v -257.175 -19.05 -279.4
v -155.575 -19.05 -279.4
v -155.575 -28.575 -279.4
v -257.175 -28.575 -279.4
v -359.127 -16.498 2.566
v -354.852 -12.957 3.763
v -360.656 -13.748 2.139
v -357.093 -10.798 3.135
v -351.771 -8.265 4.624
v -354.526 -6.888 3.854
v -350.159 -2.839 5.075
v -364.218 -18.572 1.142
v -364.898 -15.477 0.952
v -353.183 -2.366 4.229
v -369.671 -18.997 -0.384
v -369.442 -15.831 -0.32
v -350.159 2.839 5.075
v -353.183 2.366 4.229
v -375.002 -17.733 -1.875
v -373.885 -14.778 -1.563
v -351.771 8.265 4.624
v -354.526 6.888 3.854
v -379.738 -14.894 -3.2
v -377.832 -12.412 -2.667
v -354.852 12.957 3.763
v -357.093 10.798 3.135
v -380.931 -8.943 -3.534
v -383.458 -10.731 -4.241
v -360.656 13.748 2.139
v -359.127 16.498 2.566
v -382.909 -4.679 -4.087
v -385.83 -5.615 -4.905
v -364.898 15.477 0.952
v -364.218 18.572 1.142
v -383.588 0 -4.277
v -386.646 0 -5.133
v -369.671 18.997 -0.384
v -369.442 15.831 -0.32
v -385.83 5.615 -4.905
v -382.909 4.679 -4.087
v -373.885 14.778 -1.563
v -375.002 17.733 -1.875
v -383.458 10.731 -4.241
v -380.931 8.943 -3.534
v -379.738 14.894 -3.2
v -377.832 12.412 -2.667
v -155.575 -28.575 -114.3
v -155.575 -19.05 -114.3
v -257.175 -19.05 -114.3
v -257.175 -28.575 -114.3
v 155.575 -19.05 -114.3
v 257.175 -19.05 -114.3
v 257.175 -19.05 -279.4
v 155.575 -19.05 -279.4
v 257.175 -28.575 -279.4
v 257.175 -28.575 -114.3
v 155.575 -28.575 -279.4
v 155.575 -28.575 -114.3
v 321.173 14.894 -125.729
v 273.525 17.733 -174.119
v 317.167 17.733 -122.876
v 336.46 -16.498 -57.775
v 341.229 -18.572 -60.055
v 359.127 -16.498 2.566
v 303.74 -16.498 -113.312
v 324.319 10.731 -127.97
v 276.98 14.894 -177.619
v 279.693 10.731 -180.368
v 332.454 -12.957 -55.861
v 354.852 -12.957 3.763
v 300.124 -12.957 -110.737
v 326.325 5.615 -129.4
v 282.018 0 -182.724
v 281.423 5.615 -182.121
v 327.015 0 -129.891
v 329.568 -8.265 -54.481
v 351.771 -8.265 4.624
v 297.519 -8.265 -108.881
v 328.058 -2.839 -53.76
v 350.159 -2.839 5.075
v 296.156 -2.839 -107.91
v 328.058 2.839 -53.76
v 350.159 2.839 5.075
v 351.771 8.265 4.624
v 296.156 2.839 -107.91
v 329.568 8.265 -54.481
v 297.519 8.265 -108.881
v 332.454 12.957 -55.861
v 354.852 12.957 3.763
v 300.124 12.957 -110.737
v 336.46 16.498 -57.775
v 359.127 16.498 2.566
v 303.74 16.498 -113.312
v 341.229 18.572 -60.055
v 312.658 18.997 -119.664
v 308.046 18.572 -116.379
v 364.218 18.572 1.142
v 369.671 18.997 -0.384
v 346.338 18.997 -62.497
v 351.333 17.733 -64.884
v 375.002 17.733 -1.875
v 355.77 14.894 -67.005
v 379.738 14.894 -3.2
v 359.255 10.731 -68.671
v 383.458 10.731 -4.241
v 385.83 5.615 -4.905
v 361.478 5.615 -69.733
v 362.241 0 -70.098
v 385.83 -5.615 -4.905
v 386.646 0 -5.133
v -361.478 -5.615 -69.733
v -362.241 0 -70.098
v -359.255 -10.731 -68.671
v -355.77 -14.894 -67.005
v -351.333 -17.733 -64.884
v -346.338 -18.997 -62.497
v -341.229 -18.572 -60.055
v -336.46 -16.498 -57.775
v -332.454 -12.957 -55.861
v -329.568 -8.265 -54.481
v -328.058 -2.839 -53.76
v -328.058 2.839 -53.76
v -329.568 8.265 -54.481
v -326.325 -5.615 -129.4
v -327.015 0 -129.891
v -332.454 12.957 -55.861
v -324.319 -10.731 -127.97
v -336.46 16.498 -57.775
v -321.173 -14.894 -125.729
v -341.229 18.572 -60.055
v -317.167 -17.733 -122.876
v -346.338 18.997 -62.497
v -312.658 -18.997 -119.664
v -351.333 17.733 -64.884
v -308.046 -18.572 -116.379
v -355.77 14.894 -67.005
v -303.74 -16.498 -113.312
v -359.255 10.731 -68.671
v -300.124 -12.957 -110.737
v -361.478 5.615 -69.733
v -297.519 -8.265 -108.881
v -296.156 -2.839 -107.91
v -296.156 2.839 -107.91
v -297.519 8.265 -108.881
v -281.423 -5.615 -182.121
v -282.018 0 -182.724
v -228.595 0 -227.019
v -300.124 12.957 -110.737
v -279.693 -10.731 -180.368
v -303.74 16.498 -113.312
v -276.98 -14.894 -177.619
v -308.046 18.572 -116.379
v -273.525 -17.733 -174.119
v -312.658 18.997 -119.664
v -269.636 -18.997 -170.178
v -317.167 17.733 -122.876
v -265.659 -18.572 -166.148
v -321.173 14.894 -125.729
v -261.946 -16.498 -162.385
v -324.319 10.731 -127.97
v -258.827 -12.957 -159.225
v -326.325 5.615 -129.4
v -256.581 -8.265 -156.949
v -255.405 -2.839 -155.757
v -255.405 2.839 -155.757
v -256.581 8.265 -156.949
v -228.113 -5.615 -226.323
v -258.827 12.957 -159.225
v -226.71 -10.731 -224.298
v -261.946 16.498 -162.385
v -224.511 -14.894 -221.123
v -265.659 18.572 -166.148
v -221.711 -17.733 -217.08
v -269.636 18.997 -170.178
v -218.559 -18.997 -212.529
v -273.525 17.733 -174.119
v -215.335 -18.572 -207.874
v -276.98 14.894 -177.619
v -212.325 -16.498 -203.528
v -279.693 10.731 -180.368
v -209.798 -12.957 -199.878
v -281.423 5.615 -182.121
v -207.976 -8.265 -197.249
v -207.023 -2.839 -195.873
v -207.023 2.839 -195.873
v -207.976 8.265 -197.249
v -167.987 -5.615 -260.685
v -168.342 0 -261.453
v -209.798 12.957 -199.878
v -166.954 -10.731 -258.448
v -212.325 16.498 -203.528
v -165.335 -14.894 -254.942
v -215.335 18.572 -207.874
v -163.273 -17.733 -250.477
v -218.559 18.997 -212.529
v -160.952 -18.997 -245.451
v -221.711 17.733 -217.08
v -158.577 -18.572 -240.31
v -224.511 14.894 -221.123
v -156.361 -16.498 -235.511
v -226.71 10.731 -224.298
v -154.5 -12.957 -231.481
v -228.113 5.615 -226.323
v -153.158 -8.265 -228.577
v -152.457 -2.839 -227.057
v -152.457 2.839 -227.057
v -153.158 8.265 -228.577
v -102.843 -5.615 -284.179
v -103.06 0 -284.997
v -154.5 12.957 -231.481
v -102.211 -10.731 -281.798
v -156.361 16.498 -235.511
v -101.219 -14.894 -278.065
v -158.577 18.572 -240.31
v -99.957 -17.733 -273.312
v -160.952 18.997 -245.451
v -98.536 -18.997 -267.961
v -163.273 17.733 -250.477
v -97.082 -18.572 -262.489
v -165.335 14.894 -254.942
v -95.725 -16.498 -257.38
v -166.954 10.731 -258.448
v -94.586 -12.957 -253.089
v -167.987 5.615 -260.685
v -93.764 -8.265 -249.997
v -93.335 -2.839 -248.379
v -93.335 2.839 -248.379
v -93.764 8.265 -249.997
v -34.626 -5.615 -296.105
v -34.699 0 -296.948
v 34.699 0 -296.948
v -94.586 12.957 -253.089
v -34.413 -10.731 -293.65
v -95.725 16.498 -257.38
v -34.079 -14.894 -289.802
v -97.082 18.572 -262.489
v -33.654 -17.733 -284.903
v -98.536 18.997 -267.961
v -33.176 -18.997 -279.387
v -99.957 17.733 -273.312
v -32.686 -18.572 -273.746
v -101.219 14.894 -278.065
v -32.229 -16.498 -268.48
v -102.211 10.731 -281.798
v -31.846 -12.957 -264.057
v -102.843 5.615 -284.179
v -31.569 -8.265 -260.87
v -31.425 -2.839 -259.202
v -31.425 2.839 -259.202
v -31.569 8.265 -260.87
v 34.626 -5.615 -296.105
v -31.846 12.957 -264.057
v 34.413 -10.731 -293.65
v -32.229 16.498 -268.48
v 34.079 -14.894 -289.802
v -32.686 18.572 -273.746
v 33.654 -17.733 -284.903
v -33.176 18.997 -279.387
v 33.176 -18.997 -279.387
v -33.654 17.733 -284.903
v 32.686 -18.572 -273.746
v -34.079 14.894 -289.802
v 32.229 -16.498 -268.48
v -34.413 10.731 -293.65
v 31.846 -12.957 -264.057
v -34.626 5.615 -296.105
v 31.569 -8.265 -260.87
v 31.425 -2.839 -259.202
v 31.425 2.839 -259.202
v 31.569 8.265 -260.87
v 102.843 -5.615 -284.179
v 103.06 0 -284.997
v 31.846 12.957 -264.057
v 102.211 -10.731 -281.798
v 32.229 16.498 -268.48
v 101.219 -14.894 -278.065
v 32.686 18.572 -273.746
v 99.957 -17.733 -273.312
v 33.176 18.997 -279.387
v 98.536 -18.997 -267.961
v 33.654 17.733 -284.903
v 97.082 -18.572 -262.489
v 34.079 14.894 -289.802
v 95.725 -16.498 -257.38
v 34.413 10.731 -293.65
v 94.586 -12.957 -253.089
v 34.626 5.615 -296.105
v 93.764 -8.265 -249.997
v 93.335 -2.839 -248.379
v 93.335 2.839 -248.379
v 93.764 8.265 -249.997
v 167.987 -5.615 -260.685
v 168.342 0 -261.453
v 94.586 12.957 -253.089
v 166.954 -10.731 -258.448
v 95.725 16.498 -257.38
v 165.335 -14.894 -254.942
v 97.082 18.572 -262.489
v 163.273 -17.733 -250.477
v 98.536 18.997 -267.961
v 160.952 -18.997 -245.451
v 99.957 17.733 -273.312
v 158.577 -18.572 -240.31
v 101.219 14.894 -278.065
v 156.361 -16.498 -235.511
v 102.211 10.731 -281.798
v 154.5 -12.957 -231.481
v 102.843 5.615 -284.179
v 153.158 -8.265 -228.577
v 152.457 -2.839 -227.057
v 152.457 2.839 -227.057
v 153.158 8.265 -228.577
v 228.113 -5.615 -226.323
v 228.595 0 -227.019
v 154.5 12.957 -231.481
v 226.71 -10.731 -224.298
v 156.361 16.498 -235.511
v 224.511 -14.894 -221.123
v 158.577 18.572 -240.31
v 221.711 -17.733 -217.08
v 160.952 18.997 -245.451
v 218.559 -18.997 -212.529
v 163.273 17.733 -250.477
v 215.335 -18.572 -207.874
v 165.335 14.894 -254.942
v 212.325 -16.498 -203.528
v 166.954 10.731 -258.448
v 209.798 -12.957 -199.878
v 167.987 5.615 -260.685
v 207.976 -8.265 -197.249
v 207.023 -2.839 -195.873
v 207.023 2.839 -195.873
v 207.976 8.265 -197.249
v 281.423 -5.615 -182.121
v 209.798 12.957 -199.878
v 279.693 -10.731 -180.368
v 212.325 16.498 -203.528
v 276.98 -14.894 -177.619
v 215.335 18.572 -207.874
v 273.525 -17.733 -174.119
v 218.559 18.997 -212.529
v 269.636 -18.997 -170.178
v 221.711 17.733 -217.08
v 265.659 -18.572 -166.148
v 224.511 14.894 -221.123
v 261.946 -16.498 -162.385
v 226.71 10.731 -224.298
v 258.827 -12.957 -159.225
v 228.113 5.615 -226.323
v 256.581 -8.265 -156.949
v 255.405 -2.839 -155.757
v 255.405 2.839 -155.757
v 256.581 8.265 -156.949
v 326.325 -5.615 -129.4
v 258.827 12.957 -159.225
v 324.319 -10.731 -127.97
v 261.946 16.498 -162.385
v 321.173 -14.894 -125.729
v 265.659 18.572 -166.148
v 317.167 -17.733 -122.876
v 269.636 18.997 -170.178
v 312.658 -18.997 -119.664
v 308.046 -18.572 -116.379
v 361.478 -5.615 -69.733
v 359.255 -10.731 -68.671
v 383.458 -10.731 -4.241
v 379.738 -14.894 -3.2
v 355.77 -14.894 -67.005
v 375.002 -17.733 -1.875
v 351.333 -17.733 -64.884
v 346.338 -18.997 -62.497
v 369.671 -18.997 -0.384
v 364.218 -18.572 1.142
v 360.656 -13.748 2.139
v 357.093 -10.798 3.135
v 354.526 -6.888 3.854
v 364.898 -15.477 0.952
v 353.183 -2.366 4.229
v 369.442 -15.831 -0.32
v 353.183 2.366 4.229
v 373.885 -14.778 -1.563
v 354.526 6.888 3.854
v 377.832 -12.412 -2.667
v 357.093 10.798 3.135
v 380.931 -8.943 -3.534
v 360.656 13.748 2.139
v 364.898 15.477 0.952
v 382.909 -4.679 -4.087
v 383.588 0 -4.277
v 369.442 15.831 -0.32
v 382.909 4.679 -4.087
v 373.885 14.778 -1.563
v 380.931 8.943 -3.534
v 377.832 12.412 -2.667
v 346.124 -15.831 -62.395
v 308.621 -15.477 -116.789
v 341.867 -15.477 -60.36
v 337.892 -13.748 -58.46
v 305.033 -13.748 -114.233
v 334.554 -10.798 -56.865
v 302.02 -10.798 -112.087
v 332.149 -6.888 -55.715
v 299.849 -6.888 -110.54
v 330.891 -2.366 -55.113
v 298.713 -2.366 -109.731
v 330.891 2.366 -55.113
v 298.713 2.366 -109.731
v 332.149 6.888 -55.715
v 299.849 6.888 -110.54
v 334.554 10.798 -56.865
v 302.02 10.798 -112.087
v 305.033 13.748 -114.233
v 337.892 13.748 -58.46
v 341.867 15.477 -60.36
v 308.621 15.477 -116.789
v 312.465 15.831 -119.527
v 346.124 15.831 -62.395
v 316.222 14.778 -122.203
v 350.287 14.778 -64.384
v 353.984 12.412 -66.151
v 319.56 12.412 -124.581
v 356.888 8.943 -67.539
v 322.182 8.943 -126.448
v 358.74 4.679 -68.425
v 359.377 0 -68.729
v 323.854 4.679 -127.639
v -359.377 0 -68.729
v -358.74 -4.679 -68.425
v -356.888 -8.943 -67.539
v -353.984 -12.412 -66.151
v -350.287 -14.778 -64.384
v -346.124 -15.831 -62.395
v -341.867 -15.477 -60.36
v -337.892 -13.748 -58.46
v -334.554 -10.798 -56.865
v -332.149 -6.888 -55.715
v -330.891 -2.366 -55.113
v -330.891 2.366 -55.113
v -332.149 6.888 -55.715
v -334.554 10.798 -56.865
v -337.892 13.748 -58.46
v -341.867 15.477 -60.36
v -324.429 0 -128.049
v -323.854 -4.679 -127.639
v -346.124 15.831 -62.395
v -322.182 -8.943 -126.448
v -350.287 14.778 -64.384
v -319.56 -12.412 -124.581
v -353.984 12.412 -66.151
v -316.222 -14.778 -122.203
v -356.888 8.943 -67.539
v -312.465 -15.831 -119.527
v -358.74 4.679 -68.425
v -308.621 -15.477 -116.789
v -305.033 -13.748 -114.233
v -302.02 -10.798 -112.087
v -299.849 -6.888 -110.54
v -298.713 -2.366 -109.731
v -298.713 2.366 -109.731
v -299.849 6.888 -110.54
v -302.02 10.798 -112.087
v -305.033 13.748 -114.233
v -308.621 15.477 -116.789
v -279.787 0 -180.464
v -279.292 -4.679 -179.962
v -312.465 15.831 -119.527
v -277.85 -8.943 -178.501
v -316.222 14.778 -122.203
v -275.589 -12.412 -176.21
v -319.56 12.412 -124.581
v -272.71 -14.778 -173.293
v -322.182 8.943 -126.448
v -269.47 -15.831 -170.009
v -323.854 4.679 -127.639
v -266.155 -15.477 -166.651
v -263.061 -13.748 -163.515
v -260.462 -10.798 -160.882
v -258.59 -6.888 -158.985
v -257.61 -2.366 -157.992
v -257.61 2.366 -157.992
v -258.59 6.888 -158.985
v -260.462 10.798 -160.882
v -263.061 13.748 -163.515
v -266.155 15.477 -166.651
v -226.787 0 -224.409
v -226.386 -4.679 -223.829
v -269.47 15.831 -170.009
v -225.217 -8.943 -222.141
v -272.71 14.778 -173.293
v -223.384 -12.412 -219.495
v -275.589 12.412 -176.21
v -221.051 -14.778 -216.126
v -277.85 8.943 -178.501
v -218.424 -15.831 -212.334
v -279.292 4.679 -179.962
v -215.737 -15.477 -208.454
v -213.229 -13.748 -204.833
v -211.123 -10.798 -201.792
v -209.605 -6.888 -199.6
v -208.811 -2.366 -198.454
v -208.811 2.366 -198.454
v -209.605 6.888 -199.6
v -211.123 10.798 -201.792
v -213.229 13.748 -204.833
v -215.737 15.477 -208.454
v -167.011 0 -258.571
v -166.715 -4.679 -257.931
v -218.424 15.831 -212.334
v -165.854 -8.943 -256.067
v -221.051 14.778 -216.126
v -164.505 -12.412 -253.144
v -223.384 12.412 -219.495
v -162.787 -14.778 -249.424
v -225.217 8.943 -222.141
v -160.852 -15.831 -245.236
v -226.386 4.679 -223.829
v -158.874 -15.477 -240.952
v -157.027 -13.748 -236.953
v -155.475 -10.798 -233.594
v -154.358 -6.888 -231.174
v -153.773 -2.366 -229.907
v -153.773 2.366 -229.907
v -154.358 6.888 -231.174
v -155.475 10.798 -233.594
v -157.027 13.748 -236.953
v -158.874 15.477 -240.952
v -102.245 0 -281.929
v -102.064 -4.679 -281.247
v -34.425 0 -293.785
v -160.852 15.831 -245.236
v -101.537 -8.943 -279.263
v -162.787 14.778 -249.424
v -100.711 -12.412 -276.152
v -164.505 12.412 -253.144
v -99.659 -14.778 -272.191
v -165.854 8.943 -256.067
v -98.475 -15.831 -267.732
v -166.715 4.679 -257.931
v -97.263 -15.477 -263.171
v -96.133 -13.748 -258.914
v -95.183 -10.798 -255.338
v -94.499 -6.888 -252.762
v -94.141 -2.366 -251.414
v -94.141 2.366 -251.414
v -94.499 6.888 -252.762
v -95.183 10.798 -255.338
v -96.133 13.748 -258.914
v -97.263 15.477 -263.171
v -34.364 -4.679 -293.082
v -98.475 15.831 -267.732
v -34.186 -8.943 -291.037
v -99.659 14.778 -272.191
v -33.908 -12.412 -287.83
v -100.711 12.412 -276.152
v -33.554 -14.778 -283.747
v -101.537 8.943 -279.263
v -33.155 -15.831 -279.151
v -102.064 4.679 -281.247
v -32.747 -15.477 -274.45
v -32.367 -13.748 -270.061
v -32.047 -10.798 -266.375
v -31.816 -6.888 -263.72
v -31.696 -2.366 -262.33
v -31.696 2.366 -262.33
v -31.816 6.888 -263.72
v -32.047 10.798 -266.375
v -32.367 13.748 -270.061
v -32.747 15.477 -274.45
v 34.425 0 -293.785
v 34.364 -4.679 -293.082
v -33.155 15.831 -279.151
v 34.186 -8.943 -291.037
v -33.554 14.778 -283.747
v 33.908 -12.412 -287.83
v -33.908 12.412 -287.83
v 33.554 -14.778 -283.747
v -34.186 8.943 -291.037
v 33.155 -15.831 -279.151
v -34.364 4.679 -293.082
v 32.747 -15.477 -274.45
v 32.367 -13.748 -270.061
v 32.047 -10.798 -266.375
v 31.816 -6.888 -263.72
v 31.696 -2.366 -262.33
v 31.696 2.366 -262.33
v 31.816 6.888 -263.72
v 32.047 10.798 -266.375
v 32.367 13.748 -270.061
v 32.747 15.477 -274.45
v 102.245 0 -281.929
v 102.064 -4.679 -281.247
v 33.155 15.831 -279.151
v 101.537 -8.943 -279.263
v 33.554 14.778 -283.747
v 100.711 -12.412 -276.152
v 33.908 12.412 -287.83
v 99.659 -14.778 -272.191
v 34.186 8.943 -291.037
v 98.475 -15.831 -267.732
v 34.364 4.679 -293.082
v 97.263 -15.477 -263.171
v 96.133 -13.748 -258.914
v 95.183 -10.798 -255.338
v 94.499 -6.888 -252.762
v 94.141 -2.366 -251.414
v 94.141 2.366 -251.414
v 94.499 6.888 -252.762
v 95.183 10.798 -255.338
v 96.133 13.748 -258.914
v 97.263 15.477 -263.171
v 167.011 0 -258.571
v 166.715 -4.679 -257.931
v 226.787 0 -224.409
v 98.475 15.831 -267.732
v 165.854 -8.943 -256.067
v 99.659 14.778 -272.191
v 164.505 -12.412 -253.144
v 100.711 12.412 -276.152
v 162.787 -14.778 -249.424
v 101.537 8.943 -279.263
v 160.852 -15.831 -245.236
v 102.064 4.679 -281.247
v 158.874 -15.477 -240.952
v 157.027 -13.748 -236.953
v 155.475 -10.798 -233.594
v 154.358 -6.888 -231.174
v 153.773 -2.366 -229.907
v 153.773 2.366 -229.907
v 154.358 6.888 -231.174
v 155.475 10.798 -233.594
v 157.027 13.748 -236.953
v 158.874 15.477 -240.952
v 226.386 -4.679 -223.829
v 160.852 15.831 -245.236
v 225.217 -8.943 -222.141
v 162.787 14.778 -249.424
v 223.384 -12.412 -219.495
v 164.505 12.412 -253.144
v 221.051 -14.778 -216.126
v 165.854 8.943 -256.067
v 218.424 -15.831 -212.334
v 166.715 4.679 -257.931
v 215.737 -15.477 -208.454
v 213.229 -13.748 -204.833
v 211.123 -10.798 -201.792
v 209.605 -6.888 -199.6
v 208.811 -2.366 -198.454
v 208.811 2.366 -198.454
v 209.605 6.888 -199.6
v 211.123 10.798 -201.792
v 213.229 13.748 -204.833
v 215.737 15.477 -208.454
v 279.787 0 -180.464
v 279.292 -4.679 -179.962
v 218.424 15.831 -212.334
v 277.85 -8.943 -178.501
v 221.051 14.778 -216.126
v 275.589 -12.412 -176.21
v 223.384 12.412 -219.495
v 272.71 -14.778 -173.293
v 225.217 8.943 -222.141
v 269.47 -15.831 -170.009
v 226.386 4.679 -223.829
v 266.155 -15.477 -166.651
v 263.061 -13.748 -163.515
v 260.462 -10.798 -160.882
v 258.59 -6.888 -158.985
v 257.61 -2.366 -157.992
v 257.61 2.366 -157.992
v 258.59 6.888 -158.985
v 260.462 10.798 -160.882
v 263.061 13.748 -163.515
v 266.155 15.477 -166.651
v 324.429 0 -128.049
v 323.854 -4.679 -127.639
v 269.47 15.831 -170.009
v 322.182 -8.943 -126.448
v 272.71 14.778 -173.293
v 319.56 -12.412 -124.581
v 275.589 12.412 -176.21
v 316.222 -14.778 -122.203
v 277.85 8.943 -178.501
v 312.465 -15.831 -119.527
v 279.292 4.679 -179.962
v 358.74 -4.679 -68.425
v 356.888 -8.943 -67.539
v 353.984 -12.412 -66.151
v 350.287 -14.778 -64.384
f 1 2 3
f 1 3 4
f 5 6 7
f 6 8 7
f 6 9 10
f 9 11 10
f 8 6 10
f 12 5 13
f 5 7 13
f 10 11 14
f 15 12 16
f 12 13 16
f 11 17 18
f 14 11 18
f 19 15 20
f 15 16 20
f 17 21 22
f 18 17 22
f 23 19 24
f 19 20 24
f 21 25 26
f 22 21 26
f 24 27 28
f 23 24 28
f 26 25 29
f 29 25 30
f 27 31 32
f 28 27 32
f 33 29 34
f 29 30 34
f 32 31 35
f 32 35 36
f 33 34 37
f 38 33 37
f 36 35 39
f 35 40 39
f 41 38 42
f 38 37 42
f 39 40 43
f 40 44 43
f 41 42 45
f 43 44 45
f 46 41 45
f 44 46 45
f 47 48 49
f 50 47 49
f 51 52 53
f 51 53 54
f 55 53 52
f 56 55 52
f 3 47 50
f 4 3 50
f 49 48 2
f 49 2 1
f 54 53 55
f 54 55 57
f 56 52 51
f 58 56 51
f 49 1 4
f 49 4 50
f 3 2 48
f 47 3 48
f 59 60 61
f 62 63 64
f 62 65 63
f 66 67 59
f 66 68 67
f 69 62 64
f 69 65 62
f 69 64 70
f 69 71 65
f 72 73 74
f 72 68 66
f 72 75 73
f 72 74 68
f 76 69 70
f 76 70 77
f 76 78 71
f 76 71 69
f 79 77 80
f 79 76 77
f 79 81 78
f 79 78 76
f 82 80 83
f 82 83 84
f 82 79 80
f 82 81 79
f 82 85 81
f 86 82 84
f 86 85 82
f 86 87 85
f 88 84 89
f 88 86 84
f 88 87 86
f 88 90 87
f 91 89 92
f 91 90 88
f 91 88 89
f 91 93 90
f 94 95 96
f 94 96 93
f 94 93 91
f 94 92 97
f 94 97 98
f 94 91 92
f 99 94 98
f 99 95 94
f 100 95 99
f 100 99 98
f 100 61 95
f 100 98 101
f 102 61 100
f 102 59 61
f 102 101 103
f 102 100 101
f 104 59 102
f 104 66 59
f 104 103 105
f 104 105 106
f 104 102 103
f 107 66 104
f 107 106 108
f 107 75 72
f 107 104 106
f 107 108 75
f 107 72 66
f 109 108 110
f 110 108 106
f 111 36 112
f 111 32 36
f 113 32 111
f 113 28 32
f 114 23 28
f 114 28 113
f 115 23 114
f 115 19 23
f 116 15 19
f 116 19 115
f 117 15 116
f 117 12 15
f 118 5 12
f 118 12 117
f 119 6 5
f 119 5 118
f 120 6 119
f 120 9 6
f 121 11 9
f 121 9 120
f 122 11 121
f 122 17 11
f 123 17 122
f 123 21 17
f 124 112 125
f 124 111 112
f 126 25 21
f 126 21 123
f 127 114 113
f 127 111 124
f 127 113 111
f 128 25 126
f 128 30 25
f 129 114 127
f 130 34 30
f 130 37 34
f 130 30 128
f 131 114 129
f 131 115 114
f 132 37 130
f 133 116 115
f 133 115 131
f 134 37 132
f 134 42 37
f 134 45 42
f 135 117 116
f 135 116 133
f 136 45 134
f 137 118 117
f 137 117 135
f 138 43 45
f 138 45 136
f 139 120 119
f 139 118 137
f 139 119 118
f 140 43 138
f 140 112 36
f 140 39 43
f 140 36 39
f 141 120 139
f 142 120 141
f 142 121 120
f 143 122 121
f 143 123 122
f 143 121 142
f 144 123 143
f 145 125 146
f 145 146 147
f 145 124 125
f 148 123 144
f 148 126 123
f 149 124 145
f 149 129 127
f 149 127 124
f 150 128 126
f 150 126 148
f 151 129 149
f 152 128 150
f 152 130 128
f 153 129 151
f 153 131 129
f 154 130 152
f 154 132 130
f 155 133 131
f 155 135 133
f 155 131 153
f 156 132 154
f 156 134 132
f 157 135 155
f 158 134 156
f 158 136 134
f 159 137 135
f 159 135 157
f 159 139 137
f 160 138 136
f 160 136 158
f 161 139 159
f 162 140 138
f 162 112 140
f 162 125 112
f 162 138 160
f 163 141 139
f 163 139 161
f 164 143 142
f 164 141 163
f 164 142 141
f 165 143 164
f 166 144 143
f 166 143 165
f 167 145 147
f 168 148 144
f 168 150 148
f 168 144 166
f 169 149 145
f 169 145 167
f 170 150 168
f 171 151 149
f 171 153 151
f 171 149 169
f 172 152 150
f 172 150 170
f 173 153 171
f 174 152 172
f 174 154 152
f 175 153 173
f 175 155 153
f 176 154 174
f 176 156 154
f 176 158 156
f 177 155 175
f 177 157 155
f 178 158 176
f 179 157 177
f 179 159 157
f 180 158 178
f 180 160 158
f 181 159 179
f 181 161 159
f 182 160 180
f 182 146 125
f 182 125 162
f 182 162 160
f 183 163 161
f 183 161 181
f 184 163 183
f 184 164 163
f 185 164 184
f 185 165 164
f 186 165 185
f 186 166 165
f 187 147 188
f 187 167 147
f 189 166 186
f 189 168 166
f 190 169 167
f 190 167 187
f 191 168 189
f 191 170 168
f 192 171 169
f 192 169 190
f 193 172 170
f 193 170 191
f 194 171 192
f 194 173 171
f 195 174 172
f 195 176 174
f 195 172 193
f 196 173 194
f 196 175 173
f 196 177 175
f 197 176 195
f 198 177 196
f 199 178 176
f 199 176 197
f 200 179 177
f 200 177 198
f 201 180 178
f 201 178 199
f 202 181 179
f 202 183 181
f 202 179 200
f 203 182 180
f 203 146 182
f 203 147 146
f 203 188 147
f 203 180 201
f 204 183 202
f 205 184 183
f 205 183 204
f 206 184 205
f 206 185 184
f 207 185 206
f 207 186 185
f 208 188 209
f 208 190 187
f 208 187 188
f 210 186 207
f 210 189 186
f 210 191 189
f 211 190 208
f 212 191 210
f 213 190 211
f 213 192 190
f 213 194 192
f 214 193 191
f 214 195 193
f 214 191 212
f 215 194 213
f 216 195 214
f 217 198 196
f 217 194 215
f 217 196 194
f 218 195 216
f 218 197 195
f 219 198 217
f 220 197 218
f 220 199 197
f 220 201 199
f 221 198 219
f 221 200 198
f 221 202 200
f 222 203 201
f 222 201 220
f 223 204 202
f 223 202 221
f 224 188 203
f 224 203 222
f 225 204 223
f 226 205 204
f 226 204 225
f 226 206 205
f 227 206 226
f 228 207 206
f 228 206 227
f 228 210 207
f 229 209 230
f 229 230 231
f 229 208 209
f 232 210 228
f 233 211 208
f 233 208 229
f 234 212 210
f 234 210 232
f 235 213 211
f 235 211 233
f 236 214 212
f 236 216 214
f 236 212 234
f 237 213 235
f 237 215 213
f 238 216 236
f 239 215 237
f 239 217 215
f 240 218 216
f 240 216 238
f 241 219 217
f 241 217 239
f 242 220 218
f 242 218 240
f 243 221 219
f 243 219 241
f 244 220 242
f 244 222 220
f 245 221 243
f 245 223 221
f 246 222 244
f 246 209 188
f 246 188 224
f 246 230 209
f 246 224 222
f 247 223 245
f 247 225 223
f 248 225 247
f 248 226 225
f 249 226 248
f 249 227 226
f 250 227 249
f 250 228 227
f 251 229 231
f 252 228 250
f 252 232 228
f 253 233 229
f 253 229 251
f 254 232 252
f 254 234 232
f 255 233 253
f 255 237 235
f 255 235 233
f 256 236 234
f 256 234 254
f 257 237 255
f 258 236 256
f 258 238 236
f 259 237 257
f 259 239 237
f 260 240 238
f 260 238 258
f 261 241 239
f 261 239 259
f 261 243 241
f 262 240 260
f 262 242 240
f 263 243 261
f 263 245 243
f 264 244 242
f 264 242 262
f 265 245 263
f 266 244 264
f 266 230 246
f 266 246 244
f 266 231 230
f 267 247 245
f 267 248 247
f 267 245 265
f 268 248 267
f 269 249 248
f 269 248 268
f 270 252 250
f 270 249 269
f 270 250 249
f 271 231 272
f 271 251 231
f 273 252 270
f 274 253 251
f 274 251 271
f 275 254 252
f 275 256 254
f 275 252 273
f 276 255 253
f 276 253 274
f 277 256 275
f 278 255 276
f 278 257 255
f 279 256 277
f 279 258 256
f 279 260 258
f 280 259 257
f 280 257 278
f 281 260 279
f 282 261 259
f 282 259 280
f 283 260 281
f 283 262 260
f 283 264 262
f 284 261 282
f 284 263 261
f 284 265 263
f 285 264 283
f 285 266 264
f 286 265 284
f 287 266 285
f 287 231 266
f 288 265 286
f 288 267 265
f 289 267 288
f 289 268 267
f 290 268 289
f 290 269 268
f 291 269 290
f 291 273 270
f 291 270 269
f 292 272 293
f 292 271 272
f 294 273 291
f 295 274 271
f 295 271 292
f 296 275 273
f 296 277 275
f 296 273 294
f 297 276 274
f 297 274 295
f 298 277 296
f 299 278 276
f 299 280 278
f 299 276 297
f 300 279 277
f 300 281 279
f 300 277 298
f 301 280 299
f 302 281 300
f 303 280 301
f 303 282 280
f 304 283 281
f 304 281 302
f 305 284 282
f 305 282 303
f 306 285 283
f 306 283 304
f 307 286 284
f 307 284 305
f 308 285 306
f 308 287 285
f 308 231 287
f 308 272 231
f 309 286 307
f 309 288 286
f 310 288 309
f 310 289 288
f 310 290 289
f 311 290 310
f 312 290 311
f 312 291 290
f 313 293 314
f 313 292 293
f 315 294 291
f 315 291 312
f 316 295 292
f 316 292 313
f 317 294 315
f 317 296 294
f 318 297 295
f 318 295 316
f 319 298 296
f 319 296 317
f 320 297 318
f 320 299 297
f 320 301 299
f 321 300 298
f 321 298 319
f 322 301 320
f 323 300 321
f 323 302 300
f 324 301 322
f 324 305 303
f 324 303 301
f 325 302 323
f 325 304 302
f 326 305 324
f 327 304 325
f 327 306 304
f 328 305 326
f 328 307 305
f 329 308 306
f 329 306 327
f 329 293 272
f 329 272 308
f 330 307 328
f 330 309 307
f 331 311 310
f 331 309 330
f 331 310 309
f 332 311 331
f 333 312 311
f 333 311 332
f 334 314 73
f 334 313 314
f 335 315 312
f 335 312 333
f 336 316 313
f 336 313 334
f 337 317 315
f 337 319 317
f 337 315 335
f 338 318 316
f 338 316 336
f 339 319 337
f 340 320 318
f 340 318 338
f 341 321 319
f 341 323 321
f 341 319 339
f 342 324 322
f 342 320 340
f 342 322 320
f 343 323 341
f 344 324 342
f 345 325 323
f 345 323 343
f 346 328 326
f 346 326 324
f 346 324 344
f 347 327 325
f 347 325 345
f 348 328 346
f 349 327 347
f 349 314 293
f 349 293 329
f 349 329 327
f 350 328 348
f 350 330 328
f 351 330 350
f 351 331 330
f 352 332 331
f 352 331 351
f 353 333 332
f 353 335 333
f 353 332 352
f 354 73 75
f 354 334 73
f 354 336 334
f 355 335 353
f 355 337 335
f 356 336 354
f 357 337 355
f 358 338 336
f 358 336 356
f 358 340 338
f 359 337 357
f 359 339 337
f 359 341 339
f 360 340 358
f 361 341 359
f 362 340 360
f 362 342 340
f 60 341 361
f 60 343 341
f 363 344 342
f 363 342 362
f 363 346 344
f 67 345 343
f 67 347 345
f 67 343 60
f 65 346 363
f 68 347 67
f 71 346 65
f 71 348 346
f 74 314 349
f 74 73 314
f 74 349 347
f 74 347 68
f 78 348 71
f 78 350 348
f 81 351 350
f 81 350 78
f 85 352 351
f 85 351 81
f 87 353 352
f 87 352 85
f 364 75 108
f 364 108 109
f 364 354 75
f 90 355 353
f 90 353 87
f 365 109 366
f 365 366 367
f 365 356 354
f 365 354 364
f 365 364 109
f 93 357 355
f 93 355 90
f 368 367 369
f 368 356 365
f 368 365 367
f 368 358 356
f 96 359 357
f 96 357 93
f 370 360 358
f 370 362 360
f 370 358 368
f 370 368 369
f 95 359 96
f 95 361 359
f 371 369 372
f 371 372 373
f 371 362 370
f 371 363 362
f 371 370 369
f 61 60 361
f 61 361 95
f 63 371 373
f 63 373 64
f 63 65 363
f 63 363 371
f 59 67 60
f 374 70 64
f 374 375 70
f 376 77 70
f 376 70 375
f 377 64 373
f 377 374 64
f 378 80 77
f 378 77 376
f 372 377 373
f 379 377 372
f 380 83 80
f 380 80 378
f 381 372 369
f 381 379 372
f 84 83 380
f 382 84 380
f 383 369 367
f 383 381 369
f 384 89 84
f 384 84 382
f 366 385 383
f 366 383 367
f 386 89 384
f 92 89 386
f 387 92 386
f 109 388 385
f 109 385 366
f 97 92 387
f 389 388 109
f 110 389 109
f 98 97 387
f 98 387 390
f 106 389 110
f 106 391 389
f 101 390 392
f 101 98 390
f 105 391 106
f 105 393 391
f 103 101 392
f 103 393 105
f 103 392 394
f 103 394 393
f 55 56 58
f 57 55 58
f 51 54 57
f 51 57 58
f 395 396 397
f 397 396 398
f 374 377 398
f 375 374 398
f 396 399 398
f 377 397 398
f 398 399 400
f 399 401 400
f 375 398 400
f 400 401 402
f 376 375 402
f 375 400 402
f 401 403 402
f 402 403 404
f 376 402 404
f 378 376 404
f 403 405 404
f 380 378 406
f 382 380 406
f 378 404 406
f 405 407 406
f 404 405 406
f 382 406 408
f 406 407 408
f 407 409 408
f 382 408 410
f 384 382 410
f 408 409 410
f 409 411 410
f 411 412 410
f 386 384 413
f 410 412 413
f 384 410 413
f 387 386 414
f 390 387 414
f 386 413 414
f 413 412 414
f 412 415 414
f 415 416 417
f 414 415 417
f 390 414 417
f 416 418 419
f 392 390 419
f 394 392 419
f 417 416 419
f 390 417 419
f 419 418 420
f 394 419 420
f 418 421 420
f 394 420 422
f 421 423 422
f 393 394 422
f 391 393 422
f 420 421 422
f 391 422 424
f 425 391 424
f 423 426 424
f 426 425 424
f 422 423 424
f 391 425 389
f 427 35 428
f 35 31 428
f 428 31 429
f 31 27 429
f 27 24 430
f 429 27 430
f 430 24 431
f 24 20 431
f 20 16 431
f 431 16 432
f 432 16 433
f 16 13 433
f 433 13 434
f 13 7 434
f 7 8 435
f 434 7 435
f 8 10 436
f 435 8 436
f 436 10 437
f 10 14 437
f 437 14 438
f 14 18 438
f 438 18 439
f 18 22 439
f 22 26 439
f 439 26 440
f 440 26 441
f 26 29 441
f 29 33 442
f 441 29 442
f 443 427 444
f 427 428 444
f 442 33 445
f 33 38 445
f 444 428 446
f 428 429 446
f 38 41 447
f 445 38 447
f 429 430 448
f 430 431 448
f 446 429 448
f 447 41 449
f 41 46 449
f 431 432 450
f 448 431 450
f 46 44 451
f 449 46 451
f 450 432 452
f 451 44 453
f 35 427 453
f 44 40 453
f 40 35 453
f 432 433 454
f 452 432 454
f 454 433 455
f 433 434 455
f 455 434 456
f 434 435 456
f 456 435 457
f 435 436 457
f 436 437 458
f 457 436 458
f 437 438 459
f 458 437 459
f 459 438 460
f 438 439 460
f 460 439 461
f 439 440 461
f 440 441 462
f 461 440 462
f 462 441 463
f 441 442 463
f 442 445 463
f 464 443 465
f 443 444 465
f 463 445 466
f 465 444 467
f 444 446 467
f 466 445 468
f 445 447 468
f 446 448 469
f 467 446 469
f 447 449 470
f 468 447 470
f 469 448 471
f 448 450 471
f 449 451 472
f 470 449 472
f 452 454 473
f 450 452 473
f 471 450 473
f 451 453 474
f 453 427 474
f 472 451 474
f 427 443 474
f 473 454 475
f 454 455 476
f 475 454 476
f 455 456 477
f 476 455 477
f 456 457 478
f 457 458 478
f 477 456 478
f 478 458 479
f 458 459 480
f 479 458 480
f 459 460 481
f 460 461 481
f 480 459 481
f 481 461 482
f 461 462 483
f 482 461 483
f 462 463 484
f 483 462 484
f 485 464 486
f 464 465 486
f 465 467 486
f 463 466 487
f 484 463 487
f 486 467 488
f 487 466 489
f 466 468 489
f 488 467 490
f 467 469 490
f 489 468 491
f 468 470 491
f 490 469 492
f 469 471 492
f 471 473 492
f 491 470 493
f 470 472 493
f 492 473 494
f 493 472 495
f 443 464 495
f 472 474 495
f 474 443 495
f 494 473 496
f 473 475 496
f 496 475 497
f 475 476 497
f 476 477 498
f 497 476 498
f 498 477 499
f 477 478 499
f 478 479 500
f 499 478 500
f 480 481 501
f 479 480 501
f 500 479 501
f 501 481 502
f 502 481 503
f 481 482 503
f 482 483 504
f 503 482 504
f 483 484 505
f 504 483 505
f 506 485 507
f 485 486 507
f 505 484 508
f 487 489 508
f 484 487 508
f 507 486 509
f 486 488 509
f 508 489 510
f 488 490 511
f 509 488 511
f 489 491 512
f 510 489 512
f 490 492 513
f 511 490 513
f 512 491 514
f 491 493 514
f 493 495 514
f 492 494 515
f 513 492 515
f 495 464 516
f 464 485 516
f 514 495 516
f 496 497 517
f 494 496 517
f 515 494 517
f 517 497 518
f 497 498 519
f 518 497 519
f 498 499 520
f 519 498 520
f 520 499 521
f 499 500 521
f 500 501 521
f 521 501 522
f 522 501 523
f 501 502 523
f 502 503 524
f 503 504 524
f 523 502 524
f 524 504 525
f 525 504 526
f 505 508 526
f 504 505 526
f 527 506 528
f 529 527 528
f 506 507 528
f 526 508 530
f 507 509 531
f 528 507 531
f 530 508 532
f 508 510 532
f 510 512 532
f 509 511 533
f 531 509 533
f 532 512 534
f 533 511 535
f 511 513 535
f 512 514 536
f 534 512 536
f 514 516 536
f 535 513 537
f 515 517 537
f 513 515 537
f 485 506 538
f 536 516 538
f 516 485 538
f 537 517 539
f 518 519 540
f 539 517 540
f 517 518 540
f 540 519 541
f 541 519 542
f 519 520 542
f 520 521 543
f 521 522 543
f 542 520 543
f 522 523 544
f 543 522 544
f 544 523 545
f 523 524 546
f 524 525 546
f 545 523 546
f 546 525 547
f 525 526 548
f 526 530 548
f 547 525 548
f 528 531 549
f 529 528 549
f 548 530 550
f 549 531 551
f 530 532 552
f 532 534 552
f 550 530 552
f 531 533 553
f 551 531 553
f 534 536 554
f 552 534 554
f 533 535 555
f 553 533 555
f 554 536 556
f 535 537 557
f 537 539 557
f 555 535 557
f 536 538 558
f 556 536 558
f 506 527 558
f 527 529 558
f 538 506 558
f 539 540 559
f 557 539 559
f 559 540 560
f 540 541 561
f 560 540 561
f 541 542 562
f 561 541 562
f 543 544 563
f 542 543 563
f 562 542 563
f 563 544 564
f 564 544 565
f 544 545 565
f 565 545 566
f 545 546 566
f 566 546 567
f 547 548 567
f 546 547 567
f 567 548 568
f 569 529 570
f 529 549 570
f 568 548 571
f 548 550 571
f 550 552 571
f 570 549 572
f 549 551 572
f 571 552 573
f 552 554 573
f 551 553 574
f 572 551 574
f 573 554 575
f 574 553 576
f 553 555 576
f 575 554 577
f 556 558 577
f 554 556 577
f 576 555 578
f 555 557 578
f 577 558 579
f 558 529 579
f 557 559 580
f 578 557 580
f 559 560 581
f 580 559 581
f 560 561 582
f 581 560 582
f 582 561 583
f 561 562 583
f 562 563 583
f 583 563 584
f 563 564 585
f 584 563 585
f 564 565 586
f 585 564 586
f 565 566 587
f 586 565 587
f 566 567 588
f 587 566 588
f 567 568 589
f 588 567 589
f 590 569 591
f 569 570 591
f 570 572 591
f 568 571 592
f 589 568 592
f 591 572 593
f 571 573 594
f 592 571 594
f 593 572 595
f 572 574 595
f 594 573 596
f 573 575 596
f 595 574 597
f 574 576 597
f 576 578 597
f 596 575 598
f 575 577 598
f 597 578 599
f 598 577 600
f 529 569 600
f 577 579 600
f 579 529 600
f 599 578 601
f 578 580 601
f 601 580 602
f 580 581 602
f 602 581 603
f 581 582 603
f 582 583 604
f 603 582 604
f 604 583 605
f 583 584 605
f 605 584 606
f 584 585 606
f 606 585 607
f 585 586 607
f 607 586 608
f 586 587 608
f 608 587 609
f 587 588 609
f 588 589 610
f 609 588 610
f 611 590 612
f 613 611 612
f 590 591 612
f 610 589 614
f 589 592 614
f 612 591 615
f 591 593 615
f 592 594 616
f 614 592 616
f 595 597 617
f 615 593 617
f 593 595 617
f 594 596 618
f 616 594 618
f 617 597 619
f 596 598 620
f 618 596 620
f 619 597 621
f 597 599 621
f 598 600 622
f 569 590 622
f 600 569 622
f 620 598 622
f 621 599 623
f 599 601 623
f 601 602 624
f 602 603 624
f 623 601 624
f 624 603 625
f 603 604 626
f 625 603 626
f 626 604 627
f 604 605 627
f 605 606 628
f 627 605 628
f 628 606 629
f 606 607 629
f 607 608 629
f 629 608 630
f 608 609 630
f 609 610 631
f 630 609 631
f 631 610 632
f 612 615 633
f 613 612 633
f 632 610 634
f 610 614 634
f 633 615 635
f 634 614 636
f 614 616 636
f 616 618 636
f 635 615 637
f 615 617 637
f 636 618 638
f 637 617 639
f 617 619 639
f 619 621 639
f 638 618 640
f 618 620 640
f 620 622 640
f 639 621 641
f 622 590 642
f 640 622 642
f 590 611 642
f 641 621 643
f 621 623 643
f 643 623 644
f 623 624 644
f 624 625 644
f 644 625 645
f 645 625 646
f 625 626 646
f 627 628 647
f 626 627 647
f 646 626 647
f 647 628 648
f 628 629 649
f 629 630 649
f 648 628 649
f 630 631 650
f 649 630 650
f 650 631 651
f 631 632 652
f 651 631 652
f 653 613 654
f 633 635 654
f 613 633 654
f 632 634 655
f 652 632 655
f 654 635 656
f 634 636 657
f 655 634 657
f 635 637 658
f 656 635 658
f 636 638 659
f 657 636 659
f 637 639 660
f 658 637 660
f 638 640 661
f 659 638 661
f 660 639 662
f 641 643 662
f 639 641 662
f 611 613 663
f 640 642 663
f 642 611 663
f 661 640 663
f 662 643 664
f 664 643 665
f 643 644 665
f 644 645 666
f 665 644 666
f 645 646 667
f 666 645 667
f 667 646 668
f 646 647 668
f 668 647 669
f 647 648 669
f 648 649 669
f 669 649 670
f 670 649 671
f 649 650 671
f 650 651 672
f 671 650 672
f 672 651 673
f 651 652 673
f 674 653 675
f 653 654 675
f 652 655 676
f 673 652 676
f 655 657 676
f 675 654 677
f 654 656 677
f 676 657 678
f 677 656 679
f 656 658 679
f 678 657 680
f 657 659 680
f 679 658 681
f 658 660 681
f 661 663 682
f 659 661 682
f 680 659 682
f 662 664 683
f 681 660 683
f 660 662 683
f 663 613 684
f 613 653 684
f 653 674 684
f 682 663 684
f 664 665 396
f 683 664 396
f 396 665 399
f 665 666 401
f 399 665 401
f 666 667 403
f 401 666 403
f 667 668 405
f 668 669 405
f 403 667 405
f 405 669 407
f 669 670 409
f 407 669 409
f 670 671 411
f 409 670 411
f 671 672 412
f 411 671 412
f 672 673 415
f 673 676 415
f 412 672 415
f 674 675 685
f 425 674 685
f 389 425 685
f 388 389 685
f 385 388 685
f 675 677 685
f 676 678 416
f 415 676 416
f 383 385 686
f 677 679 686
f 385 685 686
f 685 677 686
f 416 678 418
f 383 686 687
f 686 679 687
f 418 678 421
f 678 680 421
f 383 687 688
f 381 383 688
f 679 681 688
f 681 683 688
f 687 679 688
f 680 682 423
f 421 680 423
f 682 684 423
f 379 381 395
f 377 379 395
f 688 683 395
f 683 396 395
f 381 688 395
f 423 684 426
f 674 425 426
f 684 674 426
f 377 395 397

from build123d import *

# Parameters (mm, degrees)
SKETCH3_R        = 19.05
SKETCH3_R_2      = 15.875
SKETCH4_W        = 101.6
SKETCH4_H        = 165.1
EXTRUDE1_DEPTH   = 9.525
EXTRUDE1_2_DEPTH = 9.525


with BuildPart() as part:
    # Sweep1: sweep along a path in Sketch1
    with BuildLine(Plane(origin=(0, 0, 0), x_dir=(1, 0, 0), z_dir=(0, 1, 0))) as sweep1_path:
        ThreePointArc((-368.3, 0), (0, 279.4), (368.3, 0))
    # Sketch3 → Sweep1 (sweep)
    with BuildSketch(Plane(origin=(368.3, 0, 0), x_dir=(0.9630188679245283, 0, -0.26943396226415106), z_dir=(0.26943396226415106, 0, 0.9630188679245284))):
        Circle(SKETCH3_R)
        Circle(SKETCH3_R_2, mode=Mode.SUBTRACT)
    sweep(path=sweep1_path.line)


with BuildPart() as body_2:
    # Sketch4 → Extrude1 (new body)
    with BuildSketch(Plane(origin=(0, -19.05, 0), x_dir=(-1, 0, 0), z_dir=(0, 1, 0))):
        with Locations((-206.375, -196.85)):
            Rectangle(SKETCH4_W, SKETCH4_H)
    extrude(amount=-EXTRUDE1_DEPTH)


with BuildPart() as body_3:
    # Sketch4 → Extrude1 2 (new body)
    with BuildSketch(Plane(origin=(0, -19.05, 0), x_dir=(-1, 0, 0), z_dir=(0, 1, 0))):
        with Locations((206.375, -196.85)):
            Rectangle(SKETCH4_W, SKETCH4_H)
    extrude(amount=-EXTRUDE1_2_DEPTH)


solid = Compound([part.part, body_2.part, body_3.part])
